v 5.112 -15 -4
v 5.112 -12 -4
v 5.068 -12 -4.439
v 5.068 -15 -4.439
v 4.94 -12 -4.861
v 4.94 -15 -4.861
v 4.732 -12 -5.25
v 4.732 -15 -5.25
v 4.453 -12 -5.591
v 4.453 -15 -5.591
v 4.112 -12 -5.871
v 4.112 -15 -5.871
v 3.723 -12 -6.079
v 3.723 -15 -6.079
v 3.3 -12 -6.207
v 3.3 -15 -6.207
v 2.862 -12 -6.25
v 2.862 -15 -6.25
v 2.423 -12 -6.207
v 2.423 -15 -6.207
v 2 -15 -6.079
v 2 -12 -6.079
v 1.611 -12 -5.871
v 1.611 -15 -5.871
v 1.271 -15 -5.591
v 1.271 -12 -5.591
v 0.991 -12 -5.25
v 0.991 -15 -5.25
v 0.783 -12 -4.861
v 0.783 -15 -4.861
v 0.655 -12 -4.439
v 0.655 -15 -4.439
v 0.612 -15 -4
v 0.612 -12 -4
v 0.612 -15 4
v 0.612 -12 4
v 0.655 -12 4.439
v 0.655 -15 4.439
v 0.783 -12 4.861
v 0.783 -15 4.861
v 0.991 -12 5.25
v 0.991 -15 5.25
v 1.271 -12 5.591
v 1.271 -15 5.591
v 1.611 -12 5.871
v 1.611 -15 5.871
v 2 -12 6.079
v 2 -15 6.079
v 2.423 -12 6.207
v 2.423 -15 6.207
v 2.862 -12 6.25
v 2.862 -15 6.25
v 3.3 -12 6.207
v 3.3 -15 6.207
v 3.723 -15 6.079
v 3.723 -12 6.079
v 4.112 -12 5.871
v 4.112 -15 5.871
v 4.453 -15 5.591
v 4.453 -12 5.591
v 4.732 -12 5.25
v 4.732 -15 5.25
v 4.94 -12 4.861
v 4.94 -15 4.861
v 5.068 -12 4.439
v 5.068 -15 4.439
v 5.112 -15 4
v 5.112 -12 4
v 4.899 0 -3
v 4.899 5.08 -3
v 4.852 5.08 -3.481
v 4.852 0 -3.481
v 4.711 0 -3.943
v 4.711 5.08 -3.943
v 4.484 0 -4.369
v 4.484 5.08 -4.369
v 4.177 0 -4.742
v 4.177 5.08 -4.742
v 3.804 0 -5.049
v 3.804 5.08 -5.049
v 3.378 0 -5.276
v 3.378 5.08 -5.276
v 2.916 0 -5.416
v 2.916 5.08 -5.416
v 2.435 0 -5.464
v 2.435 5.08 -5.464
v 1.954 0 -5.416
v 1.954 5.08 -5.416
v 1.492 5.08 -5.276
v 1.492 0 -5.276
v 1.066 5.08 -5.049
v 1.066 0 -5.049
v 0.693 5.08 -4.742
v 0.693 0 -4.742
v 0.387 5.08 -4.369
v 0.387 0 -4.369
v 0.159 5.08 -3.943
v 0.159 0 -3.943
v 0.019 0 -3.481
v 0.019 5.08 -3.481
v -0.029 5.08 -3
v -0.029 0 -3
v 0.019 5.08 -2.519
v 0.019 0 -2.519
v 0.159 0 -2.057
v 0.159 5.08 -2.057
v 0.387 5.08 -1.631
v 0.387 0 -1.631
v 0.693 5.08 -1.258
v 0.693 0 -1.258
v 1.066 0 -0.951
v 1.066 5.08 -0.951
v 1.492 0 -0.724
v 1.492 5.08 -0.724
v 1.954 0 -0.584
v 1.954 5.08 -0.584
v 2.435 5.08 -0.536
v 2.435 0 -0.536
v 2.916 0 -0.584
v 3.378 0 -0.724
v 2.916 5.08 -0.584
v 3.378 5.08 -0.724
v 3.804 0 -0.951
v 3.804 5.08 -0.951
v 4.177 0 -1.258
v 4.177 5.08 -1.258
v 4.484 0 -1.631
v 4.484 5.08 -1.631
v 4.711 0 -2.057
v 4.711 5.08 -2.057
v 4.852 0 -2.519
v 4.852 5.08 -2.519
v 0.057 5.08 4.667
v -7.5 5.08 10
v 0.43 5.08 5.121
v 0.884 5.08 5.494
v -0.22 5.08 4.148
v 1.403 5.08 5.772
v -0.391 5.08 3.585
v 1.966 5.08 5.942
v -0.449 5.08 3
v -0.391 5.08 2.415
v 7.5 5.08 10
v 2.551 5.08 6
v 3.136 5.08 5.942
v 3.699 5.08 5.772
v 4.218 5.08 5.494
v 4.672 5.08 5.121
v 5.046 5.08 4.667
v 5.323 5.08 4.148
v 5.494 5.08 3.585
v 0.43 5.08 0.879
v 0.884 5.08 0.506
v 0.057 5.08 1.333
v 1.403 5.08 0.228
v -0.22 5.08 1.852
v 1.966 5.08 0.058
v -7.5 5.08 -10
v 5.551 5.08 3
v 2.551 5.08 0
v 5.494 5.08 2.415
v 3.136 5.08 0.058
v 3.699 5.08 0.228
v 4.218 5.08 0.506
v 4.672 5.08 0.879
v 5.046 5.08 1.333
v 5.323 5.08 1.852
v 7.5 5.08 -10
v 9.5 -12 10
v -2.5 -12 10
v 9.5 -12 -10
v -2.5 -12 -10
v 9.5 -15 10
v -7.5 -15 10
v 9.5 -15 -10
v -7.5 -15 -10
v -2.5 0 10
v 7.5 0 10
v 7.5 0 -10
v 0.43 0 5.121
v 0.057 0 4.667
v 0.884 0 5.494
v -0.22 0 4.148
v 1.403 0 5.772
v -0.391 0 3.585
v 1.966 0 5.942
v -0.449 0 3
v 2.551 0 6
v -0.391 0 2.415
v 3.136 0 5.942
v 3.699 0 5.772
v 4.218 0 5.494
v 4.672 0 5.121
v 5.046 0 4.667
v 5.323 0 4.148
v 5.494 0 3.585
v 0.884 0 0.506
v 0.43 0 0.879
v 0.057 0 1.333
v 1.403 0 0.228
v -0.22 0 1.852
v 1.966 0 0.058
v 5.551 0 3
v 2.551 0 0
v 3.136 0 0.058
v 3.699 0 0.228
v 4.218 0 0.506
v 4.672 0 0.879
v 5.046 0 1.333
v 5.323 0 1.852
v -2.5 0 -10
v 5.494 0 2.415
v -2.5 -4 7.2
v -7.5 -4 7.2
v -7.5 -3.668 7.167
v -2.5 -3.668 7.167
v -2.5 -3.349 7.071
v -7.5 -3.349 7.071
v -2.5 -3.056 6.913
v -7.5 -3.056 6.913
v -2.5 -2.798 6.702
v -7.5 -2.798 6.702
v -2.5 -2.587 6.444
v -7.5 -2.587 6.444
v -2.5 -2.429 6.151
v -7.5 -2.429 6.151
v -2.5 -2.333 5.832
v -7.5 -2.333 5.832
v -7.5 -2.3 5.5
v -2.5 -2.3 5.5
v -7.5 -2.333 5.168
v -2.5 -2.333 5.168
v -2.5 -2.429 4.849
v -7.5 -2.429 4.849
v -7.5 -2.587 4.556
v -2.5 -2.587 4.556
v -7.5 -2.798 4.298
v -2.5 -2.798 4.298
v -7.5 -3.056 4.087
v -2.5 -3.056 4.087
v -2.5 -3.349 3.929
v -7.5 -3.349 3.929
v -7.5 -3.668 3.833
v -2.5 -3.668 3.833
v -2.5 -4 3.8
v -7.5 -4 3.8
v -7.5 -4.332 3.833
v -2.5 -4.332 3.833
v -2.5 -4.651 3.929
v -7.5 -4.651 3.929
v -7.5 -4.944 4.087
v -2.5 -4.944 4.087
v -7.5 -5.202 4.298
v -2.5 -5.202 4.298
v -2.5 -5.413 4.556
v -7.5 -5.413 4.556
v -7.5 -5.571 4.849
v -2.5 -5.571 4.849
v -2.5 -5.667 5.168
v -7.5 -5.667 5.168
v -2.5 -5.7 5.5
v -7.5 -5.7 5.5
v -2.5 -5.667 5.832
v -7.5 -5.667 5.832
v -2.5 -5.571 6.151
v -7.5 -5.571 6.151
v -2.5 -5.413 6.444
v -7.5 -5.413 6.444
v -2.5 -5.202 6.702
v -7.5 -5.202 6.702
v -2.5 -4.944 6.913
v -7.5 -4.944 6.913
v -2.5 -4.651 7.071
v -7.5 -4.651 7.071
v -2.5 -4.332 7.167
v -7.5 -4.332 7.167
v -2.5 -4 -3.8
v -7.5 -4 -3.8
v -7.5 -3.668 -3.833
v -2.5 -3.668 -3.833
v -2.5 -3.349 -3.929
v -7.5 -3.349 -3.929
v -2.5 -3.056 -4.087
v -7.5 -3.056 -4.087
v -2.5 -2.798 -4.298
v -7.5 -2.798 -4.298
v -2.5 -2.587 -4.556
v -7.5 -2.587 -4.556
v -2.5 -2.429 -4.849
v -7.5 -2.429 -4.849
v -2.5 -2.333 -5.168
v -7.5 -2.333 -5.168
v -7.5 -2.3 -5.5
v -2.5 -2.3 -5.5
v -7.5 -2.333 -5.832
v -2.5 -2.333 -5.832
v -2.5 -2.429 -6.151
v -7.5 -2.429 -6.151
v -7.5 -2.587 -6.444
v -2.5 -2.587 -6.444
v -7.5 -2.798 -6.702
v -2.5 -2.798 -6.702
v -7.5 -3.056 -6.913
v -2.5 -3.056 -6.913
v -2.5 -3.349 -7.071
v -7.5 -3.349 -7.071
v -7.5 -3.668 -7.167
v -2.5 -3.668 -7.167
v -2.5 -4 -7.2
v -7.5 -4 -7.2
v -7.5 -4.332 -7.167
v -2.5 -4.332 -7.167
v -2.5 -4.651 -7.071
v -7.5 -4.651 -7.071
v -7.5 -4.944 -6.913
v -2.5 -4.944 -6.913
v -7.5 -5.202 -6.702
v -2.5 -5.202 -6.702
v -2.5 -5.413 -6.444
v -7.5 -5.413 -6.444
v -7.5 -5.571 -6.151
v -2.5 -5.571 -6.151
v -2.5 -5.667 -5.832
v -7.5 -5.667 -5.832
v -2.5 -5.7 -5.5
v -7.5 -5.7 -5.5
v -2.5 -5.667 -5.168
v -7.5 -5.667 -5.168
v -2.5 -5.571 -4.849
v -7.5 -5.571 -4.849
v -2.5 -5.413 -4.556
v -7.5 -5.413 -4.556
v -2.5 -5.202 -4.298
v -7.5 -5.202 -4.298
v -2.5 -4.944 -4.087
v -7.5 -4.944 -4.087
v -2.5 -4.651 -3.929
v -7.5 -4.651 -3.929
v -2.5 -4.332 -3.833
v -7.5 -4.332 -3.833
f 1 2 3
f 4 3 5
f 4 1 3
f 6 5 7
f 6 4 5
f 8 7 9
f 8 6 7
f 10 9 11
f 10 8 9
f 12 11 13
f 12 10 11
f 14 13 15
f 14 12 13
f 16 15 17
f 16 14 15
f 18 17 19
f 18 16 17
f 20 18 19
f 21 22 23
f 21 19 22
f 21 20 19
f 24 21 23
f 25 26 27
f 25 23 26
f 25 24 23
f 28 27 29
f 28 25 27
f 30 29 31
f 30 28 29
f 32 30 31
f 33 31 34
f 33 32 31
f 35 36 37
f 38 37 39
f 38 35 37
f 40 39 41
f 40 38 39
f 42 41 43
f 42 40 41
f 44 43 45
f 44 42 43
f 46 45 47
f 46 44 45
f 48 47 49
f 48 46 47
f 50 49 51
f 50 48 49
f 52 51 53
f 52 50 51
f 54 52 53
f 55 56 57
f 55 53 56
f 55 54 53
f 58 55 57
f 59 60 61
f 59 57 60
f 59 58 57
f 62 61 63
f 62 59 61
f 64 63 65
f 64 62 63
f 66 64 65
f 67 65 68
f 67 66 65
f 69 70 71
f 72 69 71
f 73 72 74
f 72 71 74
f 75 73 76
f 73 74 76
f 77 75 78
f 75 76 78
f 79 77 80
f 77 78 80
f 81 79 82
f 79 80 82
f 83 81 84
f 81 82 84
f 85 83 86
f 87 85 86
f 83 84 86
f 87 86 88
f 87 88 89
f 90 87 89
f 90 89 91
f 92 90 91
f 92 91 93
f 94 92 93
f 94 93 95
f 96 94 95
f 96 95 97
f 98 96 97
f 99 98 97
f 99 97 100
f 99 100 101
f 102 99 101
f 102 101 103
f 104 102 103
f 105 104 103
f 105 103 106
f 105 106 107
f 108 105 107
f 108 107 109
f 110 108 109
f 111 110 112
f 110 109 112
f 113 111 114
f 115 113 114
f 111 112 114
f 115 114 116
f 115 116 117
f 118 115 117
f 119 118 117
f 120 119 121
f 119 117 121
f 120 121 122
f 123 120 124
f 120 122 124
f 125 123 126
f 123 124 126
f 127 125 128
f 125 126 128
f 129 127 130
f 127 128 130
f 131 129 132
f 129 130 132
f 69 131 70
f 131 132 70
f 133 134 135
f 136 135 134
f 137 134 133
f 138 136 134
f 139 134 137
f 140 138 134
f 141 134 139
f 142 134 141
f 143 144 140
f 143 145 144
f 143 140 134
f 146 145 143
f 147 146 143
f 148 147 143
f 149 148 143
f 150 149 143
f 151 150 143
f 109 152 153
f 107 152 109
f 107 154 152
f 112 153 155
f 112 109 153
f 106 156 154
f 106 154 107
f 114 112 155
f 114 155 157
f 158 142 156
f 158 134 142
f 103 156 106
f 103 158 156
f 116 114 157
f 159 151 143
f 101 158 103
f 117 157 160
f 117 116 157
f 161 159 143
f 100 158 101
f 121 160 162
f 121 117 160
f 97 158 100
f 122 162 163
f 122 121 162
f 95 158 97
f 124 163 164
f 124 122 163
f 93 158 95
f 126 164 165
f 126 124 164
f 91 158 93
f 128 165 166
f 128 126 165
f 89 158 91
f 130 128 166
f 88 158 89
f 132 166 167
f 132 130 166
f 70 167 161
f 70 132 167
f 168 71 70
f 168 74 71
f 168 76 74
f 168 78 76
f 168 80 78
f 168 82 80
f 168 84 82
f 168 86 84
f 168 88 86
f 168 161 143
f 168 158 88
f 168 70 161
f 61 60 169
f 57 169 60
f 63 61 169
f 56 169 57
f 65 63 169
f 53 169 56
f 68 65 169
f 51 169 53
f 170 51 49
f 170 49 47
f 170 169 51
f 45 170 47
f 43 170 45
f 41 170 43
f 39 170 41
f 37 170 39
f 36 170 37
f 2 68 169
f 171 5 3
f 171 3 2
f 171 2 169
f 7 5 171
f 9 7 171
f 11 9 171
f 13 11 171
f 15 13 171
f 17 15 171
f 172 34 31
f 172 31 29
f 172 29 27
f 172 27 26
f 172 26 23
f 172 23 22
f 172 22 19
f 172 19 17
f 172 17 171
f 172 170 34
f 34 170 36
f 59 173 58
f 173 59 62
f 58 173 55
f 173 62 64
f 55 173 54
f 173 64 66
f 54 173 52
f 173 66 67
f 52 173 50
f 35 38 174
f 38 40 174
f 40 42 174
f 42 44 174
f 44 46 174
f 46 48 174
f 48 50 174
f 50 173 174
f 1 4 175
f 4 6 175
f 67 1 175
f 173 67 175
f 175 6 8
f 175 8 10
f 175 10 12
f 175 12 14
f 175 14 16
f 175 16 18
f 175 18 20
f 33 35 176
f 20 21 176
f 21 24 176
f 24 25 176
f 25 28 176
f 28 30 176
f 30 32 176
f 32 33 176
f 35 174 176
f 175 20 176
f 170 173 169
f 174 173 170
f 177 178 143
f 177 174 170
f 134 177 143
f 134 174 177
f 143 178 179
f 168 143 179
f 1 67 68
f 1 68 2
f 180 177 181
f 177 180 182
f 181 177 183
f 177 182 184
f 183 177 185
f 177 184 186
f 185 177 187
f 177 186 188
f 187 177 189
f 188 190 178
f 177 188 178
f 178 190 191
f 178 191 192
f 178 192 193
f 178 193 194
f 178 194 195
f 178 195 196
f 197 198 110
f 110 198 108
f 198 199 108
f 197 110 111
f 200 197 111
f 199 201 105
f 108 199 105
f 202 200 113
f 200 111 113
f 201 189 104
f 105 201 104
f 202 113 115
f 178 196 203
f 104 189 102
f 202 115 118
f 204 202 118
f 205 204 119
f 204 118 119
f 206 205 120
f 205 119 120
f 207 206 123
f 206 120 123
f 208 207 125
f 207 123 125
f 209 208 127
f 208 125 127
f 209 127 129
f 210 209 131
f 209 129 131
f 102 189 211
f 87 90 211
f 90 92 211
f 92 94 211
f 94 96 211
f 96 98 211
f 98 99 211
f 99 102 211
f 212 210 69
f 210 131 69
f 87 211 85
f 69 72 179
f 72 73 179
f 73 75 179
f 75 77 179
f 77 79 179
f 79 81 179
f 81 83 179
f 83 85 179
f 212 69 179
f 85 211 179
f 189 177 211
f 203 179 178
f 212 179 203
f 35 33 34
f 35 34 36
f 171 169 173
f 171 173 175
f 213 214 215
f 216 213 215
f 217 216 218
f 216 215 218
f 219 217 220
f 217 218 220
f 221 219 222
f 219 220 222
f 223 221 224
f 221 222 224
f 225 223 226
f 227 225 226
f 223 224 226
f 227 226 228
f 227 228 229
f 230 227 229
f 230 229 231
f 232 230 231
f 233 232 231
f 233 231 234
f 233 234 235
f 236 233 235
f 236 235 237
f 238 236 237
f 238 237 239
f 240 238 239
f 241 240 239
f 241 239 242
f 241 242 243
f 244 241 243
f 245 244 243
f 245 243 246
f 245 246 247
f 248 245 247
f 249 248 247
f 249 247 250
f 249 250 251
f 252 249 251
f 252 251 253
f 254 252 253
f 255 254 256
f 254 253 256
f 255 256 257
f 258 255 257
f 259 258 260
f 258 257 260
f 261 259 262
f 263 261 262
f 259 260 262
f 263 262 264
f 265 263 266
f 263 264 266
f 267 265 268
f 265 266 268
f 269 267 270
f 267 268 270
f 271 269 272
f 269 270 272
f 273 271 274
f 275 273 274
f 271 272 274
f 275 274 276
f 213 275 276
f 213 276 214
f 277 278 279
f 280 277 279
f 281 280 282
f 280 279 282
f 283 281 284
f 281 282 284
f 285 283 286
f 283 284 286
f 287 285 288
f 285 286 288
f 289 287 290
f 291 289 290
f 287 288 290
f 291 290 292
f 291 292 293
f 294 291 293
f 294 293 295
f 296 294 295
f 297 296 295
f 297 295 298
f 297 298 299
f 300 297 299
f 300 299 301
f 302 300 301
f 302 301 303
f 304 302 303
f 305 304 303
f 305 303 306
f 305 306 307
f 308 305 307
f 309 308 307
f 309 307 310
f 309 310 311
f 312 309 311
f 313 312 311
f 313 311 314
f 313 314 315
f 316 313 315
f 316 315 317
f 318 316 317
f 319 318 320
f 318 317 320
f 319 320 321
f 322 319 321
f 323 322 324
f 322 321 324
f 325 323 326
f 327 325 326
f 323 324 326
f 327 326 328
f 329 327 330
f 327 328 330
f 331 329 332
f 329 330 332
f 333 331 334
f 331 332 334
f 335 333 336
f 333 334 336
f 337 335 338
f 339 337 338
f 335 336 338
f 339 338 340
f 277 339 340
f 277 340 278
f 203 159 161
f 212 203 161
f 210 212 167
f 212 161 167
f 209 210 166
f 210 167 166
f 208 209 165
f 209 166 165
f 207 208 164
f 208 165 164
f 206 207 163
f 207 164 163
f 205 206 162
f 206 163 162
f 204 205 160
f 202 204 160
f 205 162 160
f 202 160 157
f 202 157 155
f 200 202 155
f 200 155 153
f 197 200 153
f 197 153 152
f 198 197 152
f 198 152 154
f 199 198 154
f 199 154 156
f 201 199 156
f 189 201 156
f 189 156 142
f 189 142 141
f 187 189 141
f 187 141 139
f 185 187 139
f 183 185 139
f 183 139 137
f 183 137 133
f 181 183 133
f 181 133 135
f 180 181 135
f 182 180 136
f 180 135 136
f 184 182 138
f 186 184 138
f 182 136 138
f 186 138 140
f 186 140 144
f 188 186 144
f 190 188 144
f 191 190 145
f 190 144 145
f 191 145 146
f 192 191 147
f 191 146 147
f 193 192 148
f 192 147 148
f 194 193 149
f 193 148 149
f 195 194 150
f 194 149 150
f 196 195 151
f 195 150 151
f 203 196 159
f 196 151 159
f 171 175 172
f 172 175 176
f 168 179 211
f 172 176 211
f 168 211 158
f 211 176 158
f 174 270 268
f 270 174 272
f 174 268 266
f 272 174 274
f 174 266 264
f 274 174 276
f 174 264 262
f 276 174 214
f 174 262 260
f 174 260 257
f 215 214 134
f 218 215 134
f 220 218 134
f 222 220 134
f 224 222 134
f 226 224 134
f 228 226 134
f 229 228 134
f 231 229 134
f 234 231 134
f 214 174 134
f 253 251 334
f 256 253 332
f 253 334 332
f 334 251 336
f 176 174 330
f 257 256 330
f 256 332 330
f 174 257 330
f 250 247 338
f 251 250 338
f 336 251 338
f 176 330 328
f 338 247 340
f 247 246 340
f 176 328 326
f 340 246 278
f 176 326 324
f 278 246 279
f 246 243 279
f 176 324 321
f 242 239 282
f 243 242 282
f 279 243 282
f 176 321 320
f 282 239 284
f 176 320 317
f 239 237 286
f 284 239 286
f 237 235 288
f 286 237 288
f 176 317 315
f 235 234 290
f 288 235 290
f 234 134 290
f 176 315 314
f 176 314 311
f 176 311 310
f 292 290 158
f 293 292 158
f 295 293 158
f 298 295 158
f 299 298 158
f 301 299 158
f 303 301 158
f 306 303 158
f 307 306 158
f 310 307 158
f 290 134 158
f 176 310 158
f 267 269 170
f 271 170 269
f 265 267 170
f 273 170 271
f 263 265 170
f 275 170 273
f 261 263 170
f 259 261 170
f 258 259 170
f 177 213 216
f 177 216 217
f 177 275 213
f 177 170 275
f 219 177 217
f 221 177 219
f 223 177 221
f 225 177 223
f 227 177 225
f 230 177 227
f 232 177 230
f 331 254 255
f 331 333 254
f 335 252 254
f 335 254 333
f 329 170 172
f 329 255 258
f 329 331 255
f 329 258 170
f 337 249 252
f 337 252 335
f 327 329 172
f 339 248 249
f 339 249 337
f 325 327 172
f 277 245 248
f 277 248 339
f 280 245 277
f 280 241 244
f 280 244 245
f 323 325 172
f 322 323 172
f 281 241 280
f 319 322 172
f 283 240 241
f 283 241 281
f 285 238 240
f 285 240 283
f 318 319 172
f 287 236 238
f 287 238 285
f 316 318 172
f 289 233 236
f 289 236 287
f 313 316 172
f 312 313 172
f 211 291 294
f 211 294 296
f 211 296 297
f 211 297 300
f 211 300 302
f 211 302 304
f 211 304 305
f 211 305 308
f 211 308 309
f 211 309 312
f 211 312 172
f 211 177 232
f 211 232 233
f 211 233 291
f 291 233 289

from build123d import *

# Parameters (mm, degrees)
SKETCH1_W            = 15
SKETCH1_H            = 20
BOSS_EXTRUDE1_DEPTH  = 5.08
SKETCH2_W            = 5
SKETCH2_H            = 20
BOSS_EXTRUDE2_DEPTH  = 15
M3_CLEARANCE_HOLE1_D = 3.4
SKETCH7_W            = 20
SKETCH7_H            = 3
BOSS_EXTRUDE3_DEPTH  = 12
SKETCH3_R            = 2.4638
CUT_EXTRUDE1_DEPTH   = 12
SKETCH4_R            = 3
CUT_EXTRUDE2_DEPTH   = 12
CUT_EXTRUDE3_DEPTH   = 12


with BuildPart() as part:
    # Sketch1 → Boss-Extrude1 (new body)
    with BuildSketch(Plane(origin=(0, 0, 0), x_dir=(1, 0, 0), z_dir=(0, 1, 0))):
        Rectangle(SKETCH1_W, SKETCH1_H)
    extrude(amount=BOSS_EXTRUDE1_DEPTH)

    # Sketch2 → Boss-Extrude2 (add)
    with BuildSketch(Plane(origin=(0, 0, 0), x_dir=(-1, 0, 0), z_dir=(0, -1, 0))):
        with Locations((5, 0)):
            Rectangle(SKETCH2_W, SKETCH2_H)
    extrude(amount=BOSS_EXTRUDE2_DEPTH)

    # M3 Clearance Hole1 (through all)
    with Locations(Plane(origin=(-2.5, 0, 0), x_dir=(0, 0, -1), z_dir=(1, 0, 0))):
        with Locations((5.5, -4), (-5.5, -4)):
            Hole(M3_CLEARANCE_HOLE1_D / 2)

    # Sketch7 → Boss-Extrude3 (add)
    with BuildSketch(Plane(origin=(-2.5, 0, 0), x_dir=(0, 0, -1), z_dir=(1, 0, 0))):
        with Locations((0, -13.5)):
            Rectangle(SKETCH7_W, SKETCH7_H)
    extrude(amount=BOSS_EXTRUDE3_DEPTH)

    # Sketch3 → Cut-Extrude1 (cut)
    with BuildSketch(Plane(origin=(0, 5.08, 0), x_dir=(1, 0, 0), z_dir=(0, 1, 0))):
        with Locations((2.435150465, 3)):
            Circle(SKETCH3_R)
    extrude(amount=-CUT_EXTRUDE1_DEPTH, mode=Mode.SUBTRACT)

    # Sketch4 → Cut-Extrude2 (cut)
    with BuildSketch(Plane(origin=(0, 5.08, 0), x_dir=(1, 0, 0), z_dir=(0, 1, 0))):
        with Locations((2.551153976, -3)):
            Circle(SKETCH4_R)
    extrude(amount=-CUT_EXTRUDE2_DEPTH, mode=Mode.SUBTRACT)

    # Sketch8 → Cut-Extrude3 (cut)
    with BuildSketch(Plane(origin=(0, -15, 0), x_dir=(-1, 0, 0), z_dir=(0, -1, 0))):
        with BuildLine():
            Line((-0.611529575, 4), (-0.611529575, -4))
            ThreePointArc((-0.611529575, -4), (-2.861529575, -6.25), (-5.111529575, -4))
            Line((-5.111529575, -4), (-5.111529575, 4))
            ThreePointArc((-5.111529575, 4), (-2.861529575, 6.25), (-0.611529575, 4))
        make_face()
    extrude(amount=-CUT_EXTRUDE3_DEPTH, mode=Mode.SUBTRACT)


solid = part.part
